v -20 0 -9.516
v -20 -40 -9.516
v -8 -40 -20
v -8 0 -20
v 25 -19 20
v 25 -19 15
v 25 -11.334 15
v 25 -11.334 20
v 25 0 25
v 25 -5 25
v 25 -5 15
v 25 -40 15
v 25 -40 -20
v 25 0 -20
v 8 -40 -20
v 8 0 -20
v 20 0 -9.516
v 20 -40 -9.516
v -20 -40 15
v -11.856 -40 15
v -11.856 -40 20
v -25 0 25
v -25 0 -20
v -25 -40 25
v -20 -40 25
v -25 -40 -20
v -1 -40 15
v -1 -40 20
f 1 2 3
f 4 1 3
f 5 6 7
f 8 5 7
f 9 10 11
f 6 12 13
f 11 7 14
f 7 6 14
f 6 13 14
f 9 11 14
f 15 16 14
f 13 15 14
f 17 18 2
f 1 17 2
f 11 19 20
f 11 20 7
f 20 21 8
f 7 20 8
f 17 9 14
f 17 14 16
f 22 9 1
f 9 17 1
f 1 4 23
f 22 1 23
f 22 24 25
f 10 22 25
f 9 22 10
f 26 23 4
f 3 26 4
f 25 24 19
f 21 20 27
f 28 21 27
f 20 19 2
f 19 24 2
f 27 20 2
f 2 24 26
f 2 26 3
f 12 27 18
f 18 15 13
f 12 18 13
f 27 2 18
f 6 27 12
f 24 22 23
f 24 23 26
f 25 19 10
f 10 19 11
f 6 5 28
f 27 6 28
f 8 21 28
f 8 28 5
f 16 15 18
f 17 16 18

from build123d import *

# Parameters (mm, degrees)
F0_W     = 50
F0_H     = 40
F1_DEPTH = 40
F3_DEPTH = 40.001
F5_DEPTH = 5
F6_DEPTH = 5
F7_DEPTH = 5


with BuildPart() as f1:
    # F0 (on Front) → F1 (new body)
    with BuildSketch(Plane.XZ):
        Rectangle(F0_W, F0_H)
    extrude(amount=F1_DEPTH)

    # F2 (on face) → F3 (cut, through all)
    with BuildSketch(Plane.XZ.offset(40)):
        Polygon((-20, -9.515879), (-8, -20), (8, -20), (20, -9.515879), (0, -9.515879), align=None)
    extrude(amount=-F3_DEPTH, mode=Mode.SUBTRACT)

    # F4 (on face) → F5 (join)
    with BuildSketch(Plane.XY.offset(20)):
        Polygon((-25, 0), (-25, -40), (-20, -40), (25, -5), (25, 0), align=None)
    extrude(amount=F5_DEPTH)

    # F4 (on face) → F6 (cut)
    with BuildSketch(Plane.XY.offset(20)):
        Polygon((25, -5), (-20, -40), (-11.85589, -40), (25, -11.334308), align=None)
    extrude(amount=-F6_DEPTH, mode=Mode.SUBTRACT)

    # F4 (on face) → F7 (cut)
    with BuildSketch(Plane.XY.offset(20)):
        Polygon((25, -19), (-1, -40), (25, -40), align=None)
    extrude(amount=-F7_DEPTH, mode=Mode.SUBTRACT)


solid = f1.part
